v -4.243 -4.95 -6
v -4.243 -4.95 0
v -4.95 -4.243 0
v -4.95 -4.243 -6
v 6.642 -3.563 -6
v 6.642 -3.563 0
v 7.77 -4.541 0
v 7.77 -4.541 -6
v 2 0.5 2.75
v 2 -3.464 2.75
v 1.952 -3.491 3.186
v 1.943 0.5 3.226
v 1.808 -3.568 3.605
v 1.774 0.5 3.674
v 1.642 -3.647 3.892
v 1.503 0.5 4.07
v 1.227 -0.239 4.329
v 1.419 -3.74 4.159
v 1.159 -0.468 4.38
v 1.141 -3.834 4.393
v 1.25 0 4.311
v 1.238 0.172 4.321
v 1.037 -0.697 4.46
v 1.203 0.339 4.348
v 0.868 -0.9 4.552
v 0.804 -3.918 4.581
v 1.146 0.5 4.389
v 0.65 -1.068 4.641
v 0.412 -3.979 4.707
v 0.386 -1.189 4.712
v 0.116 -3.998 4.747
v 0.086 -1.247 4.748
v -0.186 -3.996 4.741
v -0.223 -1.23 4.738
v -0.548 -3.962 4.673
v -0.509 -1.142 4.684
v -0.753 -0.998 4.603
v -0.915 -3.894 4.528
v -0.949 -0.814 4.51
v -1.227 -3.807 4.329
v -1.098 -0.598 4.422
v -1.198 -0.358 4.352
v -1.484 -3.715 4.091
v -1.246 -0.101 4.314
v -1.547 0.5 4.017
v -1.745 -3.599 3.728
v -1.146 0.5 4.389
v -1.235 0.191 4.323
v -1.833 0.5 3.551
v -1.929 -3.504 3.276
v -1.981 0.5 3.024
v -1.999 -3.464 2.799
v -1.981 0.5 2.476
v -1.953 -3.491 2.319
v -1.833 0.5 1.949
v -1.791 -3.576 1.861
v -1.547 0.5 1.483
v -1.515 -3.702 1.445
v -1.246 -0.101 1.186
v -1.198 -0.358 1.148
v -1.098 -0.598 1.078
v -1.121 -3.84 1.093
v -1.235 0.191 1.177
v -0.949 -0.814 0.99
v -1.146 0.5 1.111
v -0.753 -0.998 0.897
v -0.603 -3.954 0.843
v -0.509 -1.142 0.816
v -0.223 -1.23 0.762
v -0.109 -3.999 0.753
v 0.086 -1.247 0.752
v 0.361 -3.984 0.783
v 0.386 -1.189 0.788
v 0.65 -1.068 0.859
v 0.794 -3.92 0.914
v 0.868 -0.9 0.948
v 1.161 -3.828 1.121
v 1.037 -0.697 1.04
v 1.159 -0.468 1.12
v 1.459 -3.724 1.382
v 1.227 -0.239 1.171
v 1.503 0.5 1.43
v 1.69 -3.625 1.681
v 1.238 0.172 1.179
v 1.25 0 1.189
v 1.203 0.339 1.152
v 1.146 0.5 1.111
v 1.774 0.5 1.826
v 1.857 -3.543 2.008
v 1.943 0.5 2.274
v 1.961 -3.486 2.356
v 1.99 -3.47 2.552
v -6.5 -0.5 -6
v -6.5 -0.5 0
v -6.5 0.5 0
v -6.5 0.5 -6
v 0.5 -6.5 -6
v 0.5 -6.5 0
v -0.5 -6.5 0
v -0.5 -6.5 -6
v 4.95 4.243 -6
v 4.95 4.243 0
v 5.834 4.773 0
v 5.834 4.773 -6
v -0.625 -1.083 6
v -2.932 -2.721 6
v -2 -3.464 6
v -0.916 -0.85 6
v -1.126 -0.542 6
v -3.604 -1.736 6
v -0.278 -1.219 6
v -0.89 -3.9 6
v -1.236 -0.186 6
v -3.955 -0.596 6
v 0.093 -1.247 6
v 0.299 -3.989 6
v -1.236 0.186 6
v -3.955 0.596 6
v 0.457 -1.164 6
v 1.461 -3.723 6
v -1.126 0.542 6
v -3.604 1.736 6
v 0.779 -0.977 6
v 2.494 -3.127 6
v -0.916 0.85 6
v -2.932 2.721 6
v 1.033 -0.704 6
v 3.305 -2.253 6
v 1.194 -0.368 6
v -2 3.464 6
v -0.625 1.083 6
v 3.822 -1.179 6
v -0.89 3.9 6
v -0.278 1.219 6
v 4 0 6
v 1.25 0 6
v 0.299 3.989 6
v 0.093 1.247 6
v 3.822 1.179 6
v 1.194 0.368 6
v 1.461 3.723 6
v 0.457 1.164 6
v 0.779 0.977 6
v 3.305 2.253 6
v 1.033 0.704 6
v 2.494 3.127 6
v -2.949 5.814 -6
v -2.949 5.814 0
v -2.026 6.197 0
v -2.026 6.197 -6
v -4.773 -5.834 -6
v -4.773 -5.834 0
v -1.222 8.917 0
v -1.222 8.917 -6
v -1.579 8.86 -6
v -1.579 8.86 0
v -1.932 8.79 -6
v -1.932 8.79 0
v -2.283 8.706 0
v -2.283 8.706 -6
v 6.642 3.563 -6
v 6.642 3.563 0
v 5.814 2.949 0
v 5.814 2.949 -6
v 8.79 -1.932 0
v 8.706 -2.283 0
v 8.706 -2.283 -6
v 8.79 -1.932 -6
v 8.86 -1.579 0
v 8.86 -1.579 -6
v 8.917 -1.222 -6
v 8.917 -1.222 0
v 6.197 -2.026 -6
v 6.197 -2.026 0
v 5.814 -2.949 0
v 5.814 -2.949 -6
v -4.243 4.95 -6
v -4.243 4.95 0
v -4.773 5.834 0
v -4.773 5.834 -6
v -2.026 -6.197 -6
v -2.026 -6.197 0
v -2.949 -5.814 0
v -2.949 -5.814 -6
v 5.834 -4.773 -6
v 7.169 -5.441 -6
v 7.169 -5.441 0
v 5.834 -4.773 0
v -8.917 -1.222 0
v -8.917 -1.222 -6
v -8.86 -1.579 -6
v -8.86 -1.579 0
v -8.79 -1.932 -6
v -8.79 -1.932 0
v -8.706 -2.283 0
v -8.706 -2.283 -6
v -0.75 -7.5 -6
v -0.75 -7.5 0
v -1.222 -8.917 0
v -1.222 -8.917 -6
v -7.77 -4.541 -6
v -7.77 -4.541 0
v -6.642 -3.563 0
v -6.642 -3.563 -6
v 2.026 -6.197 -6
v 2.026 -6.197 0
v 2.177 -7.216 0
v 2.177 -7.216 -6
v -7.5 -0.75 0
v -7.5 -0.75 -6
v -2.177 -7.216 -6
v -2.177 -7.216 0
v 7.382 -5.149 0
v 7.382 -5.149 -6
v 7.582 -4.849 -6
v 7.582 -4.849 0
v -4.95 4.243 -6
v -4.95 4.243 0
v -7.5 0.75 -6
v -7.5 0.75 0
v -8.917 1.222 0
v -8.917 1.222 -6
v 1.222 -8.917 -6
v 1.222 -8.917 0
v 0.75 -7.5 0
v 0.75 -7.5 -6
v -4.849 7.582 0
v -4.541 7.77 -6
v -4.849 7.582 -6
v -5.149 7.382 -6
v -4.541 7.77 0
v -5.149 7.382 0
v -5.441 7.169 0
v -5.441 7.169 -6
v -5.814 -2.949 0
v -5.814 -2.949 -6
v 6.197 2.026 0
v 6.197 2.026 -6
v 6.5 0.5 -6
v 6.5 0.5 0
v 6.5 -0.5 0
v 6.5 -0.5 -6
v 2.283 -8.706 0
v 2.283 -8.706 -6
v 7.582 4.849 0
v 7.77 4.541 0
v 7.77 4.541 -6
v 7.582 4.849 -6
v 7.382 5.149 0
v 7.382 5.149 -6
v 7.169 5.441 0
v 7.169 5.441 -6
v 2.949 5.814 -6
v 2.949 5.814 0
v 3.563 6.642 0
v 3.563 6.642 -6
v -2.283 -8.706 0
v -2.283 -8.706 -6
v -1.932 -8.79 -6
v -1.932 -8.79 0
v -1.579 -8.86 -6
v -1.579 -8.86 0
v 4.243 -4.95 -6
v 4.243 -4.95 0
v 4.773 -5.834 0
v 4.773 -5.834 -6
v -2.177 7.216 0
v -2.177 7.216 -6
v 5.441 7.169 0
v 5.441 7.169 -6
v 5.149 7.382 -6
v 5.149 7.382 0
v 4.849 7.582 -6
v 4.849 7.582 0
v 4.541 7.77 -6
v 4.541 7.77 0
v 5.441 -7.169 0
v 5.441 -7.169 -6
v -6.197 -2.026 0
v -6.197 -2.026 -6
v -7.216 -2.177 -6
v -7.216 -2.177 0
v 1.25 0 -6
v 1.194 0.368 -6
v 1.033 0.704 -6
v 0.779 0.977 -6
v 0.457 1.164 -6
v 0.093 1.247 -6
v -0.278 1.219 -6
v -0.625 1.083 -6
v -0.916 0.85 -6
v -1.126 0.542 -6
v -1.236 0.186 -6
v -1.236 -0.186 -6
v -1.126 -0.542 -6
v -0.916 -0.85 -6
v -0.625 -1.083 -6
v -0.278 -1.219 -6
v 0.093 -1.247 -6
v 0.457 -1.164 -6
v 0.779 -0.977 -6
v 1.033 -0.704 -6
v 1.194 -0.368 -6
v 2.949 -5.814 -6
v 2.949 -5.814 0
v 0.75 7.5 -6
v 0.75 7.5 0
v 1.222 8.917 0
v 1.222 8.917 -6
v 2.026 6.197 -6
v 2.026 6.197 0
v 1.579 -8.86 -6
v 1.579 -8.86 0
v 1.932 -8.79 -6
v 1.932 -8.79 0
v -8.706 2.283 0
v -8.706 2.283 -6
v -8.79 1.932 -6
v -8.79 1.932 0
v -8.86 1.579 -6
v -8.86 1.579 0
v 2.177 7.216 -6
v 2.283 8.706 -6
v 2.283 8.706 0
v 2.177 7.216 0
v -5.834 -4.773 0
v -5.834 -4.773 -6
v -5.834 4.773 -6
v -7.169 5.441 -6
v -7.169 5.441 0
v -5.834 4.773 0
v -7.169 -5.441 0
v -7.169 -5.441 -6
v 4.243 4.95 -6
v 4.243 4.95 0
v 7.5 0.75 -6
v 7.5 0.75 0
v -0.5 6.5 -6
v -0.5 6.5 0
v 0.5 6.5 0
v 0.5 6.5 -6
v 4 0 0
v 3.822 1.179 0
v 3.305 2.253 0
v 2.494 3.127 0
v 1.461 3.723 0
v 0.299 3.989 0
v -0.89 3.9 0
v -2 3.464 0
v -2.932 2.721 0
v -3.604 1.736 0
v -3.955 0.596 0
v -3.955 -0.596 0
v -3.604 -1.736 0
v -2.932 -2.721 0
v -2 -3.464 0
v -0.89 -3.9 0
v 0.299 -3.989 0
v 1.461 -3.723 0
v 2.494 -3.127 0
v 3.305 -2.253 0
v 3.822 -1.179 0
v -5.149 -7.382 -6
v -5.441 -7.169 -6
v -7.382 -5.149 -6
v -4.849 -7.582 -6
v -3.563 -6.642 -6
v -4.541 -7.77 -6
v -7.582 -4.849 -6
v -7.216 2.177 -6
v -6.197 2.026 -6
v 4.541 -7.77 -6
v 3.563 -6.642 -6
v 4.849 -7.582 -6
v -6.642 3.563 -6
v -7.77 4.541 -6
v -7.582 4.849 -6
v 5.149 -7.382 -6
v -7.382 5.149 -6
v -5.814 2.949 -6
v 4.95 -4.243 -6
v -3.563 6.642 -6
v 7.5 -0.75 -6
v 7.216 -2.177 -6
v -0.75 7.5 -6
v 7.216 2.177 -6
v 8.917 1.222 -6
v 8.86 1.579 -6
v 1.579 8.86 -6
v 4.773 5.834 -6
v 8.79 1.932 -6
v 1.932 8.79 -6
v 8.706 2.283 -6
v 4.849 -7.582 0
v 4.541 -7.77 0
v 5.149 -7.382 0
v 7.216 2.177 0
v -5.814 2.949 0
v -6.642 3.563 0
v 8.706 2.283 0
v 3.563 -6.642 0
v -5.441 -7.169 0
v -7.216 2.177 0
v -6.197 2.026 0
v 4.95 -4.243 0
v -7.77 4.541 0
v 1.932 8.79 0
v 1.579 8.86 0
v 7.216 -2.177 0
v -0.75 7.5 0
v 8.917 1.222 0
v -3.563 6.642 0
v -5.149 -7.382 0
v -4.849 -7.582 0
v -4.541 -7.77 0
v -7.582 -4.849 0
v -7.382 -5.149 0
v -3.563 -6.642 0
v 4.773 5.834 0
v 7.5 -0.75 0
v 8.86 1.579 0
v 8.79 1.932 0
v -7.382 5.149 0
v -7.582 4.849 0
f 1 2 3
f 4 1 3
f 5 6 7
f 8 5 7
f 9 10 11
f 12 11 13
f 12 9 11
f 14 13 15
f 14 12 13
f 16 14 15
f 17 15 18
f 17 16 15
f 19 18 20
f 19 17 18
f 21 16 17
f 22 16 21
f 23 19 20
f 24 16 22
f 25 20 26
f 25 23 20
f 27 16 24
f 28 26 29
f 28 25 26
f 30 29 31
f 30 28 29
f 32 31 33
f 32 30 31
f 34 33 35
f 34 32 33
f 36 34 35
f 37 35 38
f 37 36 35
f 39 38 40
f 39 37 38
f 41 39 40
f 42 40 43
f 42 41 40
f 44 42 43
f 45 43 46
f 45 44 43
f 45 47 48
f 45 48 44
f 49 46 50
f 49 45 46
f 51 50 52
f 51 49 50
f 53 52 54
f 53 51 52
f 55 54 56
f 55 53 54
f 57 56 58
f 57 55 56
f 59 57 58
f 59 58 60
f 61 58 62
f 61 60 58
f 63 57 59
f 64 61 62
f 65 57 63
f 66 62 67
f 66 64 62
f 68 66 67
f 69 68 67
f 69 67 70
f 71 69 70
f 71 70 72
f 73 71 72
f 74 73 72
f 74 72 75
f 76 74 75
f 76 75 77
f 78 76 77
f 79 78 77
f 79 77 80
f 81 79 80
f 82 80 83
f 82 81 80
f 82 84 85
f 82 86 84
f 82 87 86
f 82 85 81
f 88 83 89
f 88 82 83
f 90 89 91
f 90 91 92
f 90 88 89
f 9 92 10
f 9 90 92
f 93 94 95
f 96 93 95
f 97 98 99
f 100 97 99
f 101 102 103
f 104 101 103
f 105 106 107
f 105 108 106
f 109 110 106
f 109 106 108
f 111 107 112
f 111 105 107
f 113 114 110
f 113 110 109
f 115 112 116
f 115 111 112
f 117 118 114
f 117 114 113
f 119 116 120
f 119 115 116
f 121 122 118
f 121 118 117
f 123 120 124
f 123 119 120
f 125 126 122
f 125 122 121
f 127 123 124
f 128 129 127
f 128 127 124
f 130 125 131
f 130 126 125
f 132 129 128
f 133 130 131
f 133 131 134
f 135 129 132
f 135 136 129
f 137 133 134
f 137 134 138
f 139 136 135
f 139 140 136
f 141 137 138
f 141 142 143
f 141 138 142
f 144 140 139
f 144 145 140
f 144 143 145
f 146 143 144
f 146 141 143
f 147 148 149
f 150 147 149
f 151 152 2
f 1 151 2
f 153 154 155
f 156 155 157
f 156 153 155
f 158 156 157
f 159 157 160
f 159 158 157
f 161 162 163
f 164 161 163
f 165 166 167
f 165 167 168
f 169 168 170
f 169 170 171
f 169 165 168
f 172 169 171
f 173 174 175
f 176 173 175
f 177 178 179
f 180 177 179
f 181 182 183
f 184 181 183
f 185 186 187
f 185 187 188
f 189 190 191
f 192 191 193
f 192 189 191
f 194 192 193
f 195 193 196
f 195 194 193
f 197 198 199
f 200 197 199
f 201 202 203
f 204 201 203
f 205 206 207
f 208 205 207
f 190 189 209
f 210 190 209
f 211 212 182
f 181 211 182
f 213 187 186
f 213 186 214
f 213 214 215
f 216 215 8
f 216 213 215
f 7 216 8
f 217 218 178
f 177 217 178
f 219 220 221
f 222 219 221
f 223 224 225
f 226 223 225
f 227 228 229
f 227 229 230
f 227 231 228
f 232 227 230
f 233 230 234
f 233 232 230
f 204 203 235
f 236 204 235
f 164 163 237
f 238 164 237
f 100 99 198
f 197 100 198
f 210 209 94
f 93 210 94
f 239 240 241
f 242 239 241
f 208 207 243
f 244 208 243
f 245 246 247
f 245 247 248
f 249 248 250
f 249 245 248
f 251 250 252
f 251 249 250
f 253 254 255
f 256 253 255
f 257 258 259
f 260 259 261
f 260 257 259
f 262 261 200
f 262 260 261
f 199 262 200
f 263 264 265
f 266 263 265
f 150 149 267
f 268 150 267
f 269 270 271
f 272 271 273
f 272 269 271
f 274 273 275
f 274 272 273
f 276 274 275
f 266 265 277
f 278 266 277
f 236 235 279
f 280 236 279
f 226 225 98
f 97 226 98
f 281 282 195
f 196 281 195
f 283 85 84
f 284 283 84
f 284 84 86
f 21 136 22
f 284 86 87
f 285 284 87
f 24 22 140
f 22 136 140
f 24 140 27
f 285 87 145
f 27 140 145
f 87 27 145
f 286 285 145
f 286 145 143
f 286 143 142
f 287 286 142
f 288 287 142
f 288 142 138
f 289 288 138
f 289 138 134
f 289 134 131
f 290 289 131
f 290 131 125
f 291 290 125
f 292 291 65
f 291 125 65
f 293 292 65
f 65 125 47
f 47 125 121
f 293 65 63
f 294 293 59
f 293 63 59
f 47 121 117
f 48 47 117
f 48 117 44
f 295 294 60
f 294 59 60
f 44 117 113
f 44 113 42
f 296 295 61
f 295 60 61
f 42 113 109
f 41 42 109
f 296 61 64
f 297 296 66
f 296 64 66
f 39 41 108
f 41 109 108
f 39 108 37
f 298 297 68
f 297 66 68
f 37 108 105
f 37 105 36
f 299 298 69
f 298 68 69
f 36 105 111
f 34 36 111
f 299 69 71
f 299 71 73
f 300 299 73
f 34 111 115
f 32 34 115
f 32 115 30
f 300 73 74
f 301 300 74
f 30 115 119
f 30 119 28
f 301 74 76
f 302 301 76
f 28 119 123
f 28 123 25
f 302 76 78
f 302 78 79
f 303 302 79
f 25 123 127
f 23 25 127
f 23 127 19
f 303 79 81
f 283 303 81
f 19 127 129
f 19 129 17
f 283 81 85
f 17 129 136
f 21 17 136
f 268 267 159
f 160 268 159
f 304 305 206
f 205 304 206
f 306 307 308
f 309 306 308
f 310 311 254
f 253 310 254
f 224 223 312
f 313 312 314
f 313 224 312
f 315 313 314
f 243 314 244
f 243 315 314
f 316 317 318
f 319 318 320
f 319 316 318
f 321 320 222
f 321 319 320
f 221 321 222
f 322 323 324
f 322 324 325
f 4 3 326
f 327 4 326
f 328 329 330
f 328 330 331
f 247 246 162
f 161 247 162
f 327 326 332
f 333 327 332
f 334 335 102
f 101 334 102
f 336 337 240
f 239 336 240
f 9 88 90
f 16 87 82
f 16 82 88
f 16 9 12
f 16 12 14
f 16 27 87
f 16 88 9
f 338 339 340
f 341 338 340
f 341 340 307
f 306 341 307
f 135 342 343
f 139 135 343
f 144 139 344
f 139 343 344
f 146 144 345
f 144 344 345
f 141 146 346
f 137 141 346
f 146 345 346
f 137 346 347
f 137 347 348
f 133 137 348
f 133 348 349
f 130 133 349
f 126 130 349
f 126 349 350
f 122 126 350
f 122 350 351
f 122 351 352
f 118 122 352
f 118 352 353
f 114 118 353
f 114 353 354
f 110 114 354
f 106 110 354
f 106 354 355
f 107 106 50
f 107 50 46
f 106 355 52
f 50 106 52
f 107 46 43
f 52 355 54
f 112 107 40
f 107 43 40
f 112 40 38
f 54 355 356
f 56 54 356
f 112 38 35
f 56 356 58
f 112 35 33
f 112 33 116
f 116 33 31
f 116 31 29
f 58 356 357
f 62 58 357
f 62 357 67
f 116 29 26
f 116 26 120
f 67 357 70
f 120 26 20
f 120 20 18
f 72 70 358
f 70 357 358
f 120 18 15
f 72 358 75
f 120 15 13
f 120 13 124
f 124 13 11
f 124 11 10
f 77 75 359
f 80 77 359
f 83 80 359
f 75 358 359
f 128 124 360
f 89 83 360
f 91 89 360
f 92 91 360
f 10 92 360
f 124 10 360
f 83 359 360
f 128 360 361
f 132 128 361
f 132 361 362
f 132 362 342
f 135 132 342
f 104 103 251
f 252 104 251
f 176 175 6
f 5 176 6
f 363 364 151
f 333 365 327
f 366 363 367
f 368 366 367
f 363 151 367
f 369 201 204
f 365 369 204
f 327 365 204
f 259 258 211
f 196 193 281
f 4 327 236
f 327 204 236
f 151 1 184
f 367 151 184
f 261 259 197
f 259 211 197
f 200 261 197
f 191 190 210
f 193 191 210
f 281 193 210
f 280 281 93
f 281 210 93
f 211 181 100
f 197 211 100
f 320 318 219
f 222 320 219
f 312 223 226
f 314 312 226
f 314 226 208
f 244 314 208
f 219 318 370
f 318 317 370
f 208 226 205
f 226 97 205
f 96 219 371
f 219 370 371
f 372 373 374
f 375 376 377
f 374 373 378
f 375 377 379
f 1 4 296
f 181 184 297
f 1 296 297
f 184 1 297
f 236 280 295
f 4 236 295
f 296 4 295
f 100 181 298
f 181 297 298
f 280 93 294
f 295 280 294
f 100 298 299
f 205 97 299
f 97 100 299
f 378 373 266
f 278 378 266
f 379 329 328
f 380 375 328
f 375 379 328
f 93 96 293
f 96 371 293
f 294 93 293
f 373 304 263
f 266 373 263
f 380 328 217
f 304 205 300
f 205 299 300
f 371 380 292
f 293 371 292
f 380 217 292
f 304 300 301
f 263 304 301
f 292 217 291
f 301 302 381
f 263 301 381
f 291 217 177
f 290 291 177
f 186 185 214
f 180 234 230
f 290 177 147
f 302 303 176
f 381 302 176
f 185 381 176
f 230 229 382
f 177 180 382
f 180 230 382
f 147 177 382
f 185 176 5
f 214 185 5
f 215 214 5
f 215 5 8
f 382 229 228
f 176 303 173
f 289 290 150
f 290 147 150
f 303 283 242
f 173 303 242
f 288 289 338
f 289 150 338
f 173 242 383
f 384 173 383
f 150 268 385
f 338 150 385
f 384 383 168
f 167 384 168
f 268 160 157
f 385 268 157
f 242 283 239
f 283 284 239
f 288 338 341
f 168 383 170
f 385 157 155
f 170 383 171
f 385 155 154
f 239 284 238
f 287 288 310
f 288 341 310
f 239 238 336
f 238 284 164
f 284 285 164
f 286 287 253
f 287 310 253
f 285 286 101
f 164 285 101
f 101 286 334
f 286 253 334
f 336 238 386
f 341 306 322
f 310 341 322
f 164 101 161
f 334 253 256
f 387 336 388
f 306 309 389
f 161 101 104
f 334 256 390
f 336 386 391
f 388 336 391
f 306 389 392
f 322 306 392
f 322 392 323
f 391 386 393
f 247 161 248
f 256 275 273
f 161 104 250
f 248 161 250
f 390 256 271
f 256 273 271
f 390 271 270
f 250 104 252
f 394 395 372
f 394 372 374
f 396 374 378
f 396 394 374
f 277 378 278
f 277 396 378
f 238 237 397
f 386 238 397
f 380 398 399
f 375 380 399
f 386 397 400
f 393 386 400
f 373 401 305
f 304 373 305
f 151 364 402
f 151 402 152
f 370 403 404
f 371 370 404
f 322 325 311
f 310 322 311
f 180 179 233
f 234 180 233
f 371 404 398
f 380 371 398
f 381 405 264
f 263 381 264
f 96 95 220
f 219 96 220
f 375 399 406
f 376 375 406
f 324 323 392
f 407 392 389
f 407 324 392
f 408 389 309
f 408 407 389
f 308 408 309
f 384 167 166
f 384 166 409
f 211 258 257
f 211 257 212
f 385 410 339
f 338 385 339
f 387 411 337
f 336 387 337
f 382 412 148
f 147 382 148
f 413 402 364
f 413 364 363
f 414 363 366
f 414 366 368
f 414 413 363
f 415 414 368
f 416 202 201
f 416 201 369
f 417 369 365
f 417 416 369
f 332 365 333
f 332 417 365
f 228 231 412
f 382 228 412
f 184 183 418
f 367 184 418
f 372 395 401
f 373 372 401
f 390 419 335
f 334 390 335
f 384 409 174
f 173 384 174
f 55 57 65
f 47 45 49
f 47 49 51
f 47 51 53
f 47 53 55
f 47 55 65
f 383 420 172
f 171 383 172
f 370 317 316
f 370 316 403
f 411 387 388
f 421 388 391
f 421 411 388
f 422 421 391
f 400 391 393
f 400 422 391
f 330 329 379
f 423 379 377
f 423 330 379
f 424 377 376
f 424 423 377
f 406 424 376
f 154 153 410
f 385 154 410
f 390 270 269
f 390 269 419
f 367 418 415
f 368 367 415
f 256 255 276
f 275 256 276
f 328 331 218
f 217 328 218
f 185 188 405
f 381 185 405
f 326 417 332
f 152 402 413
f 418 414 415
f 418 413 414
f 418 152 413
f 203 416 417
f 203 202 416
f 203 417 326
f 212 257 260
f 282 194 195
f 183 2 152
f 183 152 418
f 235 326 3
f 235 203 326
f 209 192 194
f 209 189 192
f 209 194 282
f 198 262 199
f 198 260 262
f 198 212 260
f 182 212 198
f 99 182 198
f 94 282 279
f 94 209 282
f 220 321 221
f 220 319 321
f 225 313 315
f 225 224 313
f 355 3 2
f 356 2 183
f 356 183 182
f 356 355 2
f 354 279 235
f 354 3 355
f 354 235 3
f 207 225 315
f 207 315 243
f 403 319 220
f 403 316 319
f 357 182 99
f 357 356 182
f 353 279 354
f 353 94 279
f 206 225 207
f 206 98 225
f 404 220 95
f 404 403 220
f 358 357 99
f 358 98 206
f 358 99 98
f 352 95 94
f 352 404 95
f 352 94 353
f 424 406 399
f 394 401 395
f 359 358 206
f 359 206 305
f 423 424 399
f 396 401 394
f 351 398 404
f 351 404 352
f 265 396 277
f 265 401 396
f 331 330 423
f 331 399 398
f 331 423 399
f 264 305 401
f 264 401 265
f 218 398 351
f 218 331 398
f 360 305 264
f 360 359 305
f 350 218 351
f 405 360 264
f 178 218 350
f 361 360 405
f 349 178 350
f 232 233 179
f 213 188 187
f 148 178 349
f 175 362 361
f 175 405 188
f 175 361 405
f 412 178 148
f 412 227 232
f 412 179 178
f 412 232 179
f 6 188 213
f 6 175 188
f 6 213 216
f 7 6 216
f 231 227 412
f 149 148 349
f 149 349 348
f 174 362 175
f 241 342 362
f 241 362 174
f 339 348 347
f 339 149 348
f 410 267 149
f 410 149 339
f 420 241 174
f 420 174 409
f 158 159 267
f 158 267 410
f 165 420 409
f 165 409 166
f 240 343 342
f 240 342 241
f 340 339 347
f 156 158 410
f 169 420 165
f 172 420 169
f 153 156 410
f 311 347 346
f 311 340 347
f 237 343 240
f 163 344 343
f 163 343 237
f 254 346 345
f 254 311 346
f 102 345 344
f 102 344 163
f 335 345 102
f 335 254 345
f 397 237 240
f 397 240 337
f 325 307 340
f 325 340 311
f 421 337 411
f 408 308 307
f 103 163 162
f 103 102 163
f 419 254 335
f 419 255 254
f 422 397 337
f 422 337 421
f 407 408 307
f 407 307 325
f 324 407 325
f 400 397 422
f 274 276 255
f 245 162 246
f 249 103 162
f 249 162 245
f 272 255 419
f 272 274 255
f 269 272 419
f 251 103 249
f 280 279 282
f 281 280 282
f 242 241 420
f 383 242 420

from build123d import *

# Parameters (mm, degrees)
SKETCH_R           = 9
PAD_DEPTH          = 6
POCKET_DEPTH       = 6
POLARPATTERN_COUNT = 16
SKETCH002_R        = 4
PAD001_DEPTH       = 6
SKETCH004_R        = 2
POCKET002_DEPTH    = 5
POCKET003_DEPTH    = 0.5
SKETCH003_R        = 1.25
POCKET004_DEPTH    = 15


with BuildPart() as part:
    # Sketch → Pad (new body)
    with BuildSketch(Plane.XY):
        Circle(SKETCH_R)
    extrude(amount=-PAD_DEPTH)

    # Sketch001 (on Face6 of Pad) → Pocket (cut)
    with BuildSketch(Plane.XY):
        Polygon((-0.5, 6.5), (0.5, 6.5), (0.75, 7.5), (1.25, 9), (-1.25, 9), (-0.75, 7.5), align=None)
    pocket = extrude(amount=-POCKET_DEPTH, mode=Mode.SUBTRACT)

    # PolarPattern: Pocket ×16 about axis
    polarpattern_axis = Axis((0, 0, 0), (0, 0, 1))
    for i in range(1, POLARPATTERN_COUNT):
        add(pocket.rotate(polarpattern_axis, i * 360 / POLARPATTERN_COUNT), mode=Mode.SUBTRACT)

    # Sketch002 → Pad001 (join)
    with BuildSketch(Plane.XY):
        Circle(SKETCH002_R)
    extrude(amount=PAD001_DEPTH)

    # Sketch004 → Pocket002 (cut)
    with BuildSketch(Plane.XZ):
        with Locations((0, 2.75)):
            Circle(SKETCH004_R)
    extrude(amount=POCKET002_DEPTH, mode=Mode.SUBTRACT)

    # Sketch004 → Pocket003 (cut)
    with BuildSketch(Plane.XZ):
        with Locations((0, 2.75)):
            Circle(SKETCH004_R)
    extrude(amount=-POCKET003_DEPTH, mode=Mode.SUBTRACT)

    # Sketch003 (on Face100 of Pad001) → Pocket004 (cut)
    with BuildSketch(Plane.XY.offset(6)):
        Circle(SKETCH003_R)
    extrude(amount=-POCKET004_DEPTH, mode=Mode.SUBTRACT)


solid = part.part
